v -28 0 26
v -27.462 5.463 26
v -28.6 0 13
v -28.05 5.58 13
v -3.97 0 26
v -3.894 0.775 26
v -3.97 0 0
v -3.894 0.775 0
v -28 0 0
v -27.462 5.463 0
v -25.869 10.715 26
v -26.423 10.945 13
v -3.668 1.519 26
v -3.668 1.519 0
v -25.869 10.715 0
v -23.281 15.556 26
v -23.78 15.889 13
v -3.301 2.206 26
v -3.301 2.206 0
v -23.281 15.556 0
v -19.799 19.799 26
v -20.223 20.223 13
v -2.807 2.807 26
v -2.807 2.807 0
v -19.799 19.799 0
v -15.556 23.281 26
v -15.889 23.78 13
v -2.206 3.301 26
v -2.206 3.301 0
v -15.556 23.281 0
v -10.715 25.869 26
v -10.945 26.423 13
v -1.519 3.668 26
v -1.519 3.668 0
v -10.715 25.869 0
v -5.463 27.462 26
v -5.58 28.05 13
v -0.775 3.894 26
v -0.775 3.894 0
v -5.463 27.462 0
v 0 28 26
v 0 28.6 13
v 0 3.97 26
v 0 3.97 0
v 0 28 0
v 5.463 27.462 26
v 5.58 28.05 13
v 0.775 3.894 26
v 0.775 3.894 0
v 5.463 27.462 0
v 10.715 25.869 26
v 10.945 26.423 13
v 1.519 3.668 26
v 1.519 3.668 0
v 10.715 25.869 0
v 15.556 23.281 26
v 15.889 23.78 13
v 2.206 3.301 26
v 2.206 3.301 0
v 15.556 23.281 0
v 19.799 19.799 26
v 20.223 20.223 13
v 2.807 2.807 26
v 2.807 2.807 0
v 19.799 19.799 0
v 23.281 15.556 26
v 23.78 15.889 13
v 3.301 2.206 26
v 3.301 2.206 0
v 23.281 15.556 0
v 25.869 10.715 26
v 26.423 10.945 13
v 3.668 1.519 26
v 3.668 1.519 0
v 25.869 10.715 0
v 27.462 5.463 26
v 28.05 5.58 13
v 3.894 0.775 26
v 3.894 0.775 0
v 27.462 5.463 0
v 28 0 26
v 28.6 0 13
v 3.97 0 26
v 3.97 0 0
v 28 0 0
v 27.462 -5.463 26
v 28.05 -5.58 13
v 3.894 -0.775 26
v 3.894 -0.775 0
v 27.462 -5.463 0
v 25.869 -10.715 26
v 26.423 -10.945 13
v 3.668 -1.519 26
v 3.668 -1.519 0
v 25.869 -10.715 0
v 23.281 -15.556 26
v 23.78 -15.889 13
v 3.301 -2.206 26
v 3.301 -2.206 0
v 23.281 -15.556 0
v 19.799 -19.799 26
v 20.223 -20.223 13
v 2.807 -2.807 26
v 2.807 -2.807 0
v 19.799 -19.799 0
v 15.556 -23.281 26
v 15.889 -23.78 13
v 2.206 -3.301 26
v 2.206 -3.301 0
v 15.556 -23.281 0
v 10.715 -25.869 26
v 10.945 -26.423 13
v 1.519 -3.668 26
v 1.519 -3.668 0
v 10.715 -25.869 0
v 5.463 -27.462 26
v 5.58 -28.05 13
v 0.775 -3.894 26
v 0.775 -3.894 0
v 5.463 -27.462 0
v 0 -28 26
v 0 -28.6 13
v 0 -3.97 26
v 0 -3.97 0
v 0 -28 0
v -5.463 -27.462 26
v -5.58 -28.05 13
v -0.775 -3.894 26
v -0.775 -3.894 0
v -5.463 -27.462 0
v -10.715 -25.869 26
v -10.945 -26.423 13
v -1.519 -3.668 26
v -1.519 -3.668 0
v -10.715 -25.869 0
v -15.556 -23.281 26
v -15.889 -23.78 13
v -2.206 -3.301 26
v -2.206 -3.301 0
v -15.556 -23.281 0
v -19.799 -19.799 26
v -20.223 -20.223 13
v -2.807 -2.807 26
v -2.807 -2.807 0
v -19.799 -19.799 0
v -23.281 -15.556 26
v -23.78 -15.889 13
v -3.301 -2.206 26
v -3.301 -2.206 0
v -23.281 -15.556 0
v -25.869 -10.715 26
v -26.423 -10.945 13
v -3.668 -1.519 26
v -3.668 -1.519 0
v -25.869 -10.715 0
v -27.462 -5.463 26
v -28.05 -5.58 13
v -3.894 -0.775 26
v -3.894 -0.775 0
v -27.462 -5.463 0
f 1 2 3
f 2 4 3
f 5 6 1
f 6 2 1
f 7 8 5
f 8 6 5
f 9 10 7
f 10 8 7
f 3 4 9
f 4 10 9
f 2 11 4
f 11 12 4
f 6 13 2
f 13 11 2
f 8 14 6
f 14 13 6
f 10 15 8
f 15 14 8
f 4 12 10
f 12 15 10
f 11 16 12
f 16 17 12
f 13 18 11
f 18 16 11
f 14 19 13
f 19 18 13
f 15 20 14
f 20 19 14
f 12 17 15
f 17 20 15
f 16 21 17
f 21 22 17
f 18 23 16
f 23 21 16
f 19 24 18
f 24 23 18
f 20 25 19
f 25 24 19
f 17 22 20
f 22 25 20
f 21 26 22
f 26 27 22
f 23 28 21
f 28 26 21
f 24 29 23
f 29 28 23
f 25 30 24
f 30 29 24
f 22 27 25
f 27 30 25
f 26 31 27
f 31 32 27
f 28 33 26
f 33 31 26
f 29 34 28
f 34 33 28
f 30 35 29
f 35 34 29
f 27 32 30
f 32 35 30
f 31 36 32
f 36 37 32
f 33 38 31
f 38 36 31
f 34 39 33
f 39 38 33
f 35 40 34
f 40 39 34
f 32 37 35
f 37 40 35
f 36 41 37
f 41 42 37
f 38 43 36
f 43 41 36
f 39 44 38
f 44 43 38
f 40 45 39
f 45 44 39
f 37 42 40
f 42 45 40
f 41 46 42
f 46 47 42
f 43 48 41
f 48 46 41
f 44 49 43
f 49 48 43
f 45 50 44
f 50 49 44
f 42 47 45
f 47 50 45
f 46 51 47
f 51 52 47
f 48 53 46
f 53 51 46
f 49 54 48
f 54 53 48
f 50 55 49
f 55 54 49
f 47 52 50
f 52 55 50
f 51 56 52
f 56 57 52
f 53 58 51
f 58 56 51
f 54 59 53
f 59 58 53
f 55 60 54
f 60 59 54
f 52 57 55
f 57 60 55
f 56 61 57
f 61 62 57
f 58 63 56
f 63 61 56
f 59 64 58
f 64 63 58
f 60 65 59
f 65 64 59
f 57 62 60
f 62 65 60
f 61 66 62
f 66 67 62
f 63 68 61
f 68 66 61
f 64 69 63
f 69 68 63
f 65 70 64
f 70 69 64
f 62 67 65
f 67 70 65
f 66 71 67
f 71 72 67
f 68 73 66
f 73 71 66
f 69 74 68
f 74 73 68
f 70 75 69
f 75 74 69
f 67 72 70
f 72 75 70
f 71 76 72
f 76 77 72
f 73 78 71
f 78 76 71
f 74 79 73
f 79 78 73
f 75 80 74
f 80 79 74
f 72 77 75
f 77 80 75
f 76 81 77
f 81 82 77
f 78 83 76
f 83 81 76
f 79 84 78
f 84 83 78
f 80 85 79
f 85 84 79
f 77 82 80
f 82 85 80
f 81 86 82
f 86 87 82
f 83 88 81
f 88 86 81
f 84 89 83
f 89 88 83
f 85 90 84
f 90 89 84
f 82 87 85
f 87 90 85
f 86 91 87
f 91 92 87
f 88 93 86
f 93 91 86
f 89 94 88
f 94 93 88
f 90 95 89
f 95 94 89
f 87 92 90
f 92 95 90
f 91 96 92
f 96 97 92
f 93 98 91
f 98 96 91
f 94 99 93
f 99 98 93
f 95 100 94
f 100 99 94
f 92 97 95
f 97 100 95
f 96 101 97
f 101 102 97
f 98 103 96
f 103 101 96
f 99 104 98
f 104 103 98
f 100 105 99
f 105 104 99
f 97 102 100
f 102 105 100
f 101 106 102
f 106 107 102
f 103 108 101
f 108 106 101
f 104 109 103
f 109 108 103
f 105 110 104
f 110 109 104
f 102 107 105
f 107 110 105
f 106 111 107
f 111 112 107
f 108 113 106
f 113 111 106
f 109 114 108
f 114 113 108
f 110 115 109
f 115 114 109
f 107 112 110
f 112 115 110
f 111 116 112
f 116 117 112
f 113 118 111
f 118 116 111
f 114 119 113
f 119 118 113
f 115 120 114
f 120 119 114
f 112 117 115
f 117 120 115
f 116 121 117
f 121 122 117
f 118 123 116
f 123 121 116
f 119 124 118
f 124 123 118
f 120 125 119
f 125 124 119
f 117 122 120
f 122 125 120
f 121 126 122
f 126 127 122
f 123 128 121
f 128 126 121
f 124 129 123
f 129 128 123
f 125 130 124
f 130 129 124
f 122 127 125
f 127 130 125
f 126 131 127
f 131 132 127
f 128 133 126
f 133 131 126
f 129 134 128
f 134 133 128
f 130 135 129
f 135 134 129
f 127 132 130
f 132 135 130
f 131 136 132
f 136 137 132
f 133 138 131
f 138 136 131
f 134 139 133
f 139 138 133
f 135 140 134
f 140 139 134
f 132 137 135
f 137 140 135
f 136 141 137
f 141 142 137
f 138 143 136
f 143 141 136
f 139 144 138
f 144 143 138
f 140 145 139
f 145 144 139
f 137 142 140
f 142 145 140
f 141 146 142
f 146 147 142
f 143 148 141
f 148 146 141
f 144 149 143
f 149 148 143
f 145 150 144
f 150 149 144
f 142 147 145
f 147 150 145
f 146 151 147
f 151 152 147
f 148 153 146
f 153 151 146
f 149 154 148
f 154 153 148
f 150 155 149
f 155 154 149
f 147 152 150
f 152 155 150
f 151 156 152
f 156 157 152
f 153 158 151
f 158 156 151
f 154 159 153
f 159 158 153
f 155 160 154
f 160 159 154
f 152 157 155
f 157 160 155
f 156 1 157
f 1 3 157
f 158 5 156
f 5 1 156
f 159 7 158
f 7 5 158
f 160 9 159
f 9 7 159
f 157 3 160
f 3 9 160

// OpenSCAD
$fn = 32;

// ----------------------------------------------------------------------
// Belt roller: 56 mm barrel, 26 mm wide, bore 7.94 mm
// ----------------------------------------------------------------------

// --- parameters (mm) ---
bore_d = 7.94;            // bore
barrel_d = 56;            // barrel diameter
roller_w = 26;            // roller width
crown = 0.6;              // crown height at mid width

roller_profile = [[3.97, 0], [28, 0], [28.6, 13], [28, 26], [3.97, 26]];

/* the profile stays clear of the axis, so the bore comes out of the revolve */
rotate_extrude() polygon(roller_profile);
